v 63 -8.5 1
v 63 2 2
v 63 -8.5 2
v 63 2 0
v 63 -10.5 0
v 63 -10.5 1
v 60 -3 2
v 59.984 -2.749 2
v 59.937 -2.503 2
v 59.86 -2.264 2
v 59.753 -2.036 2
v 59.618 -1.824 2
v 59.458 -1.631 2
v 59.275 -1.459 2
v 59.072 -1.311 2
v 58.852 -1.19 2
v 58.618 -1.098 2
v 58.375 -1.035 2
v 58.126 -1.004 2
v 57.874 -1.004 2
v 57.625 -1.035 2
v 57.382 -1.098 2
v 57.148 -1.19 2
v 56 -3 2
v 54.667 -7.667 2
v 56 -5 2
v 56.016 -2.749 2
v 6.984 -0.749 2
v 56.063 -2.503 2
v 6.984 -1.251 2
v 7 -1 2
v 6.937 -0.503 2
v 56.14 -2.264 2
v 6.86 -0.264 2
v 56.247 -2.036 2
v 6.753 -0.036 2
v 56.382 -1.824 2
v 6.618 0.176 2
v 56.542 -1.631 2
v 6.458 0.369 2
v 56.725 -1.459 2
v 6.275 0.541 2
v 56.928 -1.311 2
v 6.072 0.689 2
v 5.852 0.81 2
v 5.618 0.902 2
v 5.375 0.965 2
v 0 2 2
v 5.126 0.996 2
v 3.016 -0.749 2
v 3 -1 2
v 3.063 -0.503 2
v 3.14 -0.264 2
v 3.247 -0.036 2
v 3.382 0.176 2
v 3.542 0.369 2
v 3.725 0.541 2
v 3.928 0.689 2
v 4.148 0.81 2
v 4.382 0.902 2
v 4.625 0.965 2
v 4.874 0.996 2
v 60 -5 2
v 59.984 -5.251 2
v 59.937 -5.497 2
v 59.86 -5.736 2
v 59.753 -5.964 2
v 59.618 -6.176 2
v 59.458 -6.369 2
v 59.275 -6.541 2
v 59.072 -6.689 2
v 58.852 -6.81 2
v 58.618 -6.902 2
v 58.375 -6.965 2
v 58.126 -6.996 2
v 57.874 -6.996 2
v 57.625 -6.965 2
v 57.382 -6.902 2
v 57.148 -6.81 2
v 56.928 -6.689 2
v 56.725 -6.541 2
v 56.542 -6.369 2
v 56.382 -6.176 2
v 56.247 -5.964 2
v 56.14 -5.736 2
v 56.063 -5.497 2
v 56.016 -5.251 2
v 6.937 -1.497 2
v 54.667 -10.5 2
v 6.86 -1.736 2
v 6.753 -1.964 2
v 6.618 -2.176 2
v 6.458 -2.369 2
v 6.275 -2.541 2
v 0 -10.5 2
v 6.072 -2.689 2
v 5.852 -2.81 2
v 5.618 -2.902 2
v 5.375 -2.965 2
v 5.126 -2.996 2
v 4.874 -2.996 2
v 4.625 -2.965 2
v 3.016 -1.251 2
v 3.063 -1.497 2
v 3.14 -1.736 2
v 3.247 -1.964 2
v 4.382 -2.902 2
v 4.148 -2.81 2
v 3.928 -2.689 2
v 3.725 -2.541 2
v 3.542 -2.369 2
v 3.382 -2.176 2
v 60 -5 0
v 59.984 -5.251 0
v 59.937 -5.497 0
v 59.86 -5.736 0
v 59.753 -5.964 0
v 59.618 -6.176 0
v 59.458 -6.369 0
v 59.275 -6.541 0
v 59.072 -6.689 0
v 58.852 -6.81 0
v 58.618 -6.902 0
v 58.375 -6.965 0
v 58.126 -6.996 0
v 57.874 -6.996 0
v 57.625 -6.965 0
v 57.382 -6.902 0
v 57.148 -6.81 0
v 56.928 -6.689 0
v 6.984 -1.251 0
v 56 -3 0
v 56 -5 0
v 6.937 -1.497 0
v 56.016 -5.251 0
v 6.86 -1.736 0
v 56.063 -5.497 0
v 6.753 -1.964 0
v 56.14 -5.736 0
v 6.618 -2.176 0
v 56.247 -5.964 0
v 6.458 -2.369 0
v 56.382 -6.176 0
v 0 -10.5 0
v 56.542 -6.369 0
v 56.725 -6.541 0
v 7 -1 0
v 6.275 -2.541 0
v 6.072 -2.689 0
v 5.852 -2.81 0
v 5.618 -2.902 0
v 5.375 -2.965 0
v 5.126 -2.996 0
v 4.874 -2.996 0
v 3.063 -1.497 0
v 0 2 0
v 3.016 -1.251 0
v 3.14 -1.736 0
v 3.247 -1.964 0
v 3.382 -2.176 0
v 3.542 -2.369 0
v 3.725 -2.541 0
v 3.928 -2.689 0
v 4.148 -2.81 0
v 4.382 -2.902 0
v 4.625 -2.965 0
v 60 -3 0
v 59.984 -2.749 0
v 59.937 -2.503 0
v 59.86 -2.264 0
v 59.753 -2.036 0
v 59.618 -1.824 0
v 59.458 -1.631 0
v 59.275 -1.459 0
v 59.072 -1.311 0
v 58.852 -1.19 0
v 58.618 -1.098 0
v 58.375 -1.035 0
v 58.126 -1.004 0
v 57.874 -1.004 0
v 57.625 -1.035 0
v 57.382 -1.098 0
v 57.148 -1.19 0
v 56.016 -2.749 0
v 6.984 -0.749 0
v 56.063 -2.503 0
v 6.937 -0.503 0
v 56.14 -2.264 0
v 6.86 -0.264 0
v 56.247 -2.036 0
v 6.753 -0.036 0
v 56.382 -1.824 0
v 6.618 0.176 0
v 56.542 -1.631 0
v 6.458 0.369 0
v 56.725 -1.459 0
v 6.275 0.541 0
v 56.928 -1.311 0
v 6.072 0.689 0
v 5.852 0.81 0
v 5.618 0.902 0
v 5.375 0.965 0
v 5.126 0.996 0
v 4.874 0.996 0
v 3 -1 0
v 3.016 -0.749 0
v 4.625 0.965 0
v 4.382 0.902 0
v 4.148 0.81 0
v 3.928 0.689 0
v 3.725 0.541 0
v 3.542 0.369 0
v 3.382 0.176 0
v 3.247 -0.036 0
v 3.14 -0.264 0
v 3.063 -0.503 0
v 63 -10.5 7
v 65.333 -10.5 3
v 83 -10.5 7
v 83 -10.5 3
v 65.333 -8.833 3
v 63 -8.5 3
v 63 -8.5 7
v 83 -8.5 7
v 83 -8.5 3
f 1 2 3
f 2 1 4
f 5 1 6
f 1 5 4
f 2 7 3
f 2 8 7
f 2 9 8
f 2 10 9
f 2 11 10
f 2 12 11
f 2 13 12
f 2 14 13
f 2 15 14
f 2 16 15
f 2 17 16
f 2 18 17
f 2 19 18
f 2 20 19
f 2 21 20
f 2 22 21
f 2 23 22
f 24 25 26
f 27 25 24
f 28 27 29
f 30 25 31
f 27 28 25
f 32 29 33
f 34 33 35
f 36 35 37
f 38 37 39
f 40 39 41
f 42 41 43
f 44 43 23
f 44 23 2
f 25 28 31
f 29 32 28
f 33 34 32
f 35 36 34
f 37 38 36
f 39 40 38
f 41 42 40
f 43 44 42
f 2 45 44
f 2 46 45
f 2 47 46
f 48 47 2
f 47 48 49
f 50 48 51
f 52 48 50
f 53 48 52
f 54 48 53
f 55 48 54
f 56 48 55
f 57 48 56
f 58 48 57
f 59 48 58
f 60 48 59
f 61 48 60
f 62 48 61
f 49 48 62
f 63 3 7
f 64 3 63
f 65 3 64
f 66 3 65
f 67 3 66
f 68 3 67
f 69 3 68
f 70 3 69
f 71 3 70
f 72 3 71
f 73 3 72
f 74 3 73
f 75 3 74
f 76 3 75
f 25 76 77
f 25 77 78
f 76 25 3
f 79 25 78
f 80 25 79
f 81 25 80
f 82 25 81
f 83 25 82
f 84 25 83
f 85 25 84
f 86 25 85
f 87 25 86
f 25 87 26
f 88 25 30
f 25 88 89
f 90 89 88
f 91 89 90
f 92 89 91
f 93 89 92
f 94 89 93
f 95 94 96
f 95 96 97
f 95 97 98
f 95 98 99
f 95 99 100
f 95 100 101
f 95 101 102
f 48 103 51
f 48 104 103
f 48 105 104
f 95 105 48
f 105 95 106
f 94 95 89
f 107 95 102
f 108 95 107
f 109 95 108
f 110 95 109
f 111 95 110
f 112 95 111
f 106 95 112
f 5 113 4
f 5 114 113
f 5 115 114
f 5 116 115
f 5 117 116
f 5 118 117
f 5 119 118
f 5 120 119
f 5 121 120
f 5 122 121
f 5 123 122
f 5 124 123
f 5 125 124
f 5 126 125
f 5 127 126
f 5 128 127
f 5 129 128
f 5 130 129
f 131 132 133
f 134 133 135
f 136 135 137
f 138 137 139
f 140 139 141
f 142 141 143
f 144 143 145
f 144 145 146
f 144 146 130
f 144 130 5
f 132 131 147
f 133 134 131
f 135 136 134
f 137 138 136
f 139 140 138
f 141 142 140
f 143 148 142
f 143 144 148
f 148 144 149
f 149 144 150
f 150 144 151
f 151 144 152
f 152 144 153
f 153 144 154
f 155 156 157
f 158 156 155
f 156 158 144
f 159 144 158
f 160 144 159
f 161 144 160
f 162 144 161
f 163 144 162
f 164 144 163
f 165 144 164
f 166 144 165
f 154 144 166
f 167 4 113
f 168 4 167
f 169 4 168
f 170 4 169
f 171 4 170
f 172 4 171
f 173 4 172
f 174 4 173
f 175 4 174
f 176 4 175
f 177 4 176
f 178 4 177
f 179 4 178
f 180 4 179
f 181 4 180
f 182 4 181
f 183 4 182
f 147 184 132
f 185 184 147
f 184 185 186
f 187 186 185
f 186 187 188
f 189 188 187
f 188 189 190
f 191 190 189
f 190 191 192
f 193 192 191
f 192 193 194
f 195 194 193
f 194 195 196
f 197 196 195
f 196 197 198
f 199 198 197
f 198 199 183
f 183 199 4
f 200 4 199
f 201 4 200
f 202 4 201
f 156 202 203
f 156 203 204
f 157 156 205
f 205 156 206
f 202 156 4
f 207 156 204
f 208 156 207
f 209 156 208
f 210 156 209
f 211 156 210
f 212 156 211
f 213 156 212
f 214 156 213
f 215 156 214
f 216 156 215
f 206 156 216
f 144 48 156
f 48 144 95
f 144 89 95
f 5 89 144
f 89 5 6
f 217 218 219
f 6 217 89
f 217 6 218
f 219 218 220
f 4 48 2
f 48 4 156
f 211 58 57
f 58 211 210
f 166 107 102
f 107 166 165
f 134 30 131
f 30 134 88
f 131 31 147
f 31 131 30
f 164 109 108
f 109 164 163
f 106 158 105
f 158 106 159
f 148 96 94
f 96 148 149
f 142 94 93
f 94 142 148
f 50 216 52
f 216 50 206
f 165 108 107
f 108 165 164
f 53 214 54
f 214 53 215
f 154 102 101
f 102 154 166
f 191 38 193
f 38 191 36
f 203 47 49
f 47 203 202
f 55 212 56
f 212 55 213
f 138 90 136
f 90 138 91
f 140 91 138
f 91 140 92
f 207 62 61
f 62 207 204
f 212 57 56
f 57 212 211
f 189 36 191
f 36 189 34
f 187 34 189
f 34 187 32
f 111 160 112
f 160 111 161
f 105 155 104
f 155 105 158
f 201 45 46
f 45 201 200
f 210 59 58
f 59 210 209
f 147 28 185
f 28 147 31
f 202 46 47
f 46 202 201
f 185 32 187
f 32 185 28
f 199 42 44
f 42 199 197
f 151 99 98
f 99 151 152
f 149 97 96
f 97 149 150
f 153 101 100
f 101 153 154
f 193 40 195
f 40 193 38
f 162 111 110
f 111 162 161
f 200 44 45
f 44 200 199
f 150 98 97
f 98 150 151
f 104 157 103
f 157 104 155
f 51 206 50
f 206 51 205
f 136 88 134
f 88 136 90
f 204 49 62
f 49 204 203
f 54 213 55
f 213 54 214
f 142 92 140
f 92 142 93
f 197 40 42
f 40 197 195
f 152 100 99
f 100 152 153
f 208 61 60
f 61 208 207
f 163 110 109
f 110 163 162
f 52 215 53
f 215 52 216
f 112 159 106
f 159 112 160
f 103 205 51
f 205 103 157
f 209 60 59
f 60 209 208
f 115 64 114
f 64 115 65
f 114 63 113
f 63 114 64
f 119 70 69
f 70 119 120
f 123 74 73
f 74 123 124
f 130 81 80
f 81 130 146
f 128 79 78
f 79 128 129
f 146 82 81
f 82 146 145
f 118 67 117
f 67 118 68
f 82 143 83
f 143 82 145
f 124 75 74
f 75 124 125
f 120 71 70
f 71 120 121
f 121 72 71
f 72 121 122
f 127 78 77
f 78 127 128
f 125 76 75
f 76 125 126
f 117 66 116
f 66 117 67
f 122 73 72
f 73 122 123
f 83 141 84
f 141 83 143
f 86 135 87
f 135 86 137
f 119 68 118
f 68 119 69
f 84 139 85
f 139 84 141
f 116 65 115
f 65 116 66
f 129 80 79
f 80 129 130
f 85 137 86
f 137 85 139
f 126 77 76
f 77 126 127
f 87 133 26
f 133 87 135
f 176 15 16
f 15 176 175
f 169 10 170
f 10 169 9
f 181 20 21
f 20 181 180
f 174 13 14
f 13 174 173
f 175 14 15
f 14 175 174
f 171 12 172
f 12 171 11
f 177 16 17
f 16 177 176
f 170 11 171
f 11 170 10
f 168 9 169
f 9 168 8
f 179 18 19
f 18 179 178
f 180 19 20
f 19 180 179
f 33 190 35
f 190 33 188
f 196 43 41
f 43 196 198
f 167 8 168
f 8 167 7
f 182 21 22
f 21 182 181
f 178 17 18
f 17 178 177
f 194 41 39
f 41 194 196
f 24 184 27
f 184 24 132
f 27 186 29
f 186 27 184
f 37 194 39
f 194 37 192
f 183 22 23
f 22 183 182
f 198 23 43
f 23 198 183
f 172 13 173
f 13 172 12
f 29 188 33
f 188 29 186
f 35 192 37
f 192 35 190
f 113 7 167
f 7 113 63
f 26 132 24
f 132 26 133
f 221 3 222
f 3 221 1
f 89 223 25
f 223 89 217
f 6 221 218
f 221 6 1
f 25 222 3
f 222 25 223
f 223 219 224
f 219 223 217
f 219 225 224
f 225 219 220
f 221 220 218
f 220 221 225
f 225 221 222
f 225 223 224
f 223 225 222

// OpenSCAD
$fn=50;

mirror([0,1,0])
union(){
difference(){
    translate([0,-2,0]) cube([63,12.5,2]);
    translate([5,1,0]) cylinder(2,2,2);
    translate([58,5,0]) cylinder(2,2,2);
    translate([58,3,0]) cylinder(2,2,2);
    translate([56,3,0]) cube([4,2,2]);
    }
points=[[0,-2,0],    //0
             [10,-1,6],  //1
             [17,0,6],  //2
             [10,-1,0],  //3
             [0,1,0],    //4
             [10,1,0],  //5
             [17,1,6],  //6
             [10,1,6]  //7
             ];
faces=[
             [0,1,2,3], //right
             [4,5,6,7],  //left
             [0,4,7,1],  //schräge oben
             [0,3,5,4],  //bottom
             [1,7,6,2],  //top
             [2,6,5,3]    //schräge unten
           ]; 
    translate([53,9.5,1]) 
        polyhedron(points,faces,convexity=10);
    translate([63,8.5,3]) cube([20,2,4]);
}
